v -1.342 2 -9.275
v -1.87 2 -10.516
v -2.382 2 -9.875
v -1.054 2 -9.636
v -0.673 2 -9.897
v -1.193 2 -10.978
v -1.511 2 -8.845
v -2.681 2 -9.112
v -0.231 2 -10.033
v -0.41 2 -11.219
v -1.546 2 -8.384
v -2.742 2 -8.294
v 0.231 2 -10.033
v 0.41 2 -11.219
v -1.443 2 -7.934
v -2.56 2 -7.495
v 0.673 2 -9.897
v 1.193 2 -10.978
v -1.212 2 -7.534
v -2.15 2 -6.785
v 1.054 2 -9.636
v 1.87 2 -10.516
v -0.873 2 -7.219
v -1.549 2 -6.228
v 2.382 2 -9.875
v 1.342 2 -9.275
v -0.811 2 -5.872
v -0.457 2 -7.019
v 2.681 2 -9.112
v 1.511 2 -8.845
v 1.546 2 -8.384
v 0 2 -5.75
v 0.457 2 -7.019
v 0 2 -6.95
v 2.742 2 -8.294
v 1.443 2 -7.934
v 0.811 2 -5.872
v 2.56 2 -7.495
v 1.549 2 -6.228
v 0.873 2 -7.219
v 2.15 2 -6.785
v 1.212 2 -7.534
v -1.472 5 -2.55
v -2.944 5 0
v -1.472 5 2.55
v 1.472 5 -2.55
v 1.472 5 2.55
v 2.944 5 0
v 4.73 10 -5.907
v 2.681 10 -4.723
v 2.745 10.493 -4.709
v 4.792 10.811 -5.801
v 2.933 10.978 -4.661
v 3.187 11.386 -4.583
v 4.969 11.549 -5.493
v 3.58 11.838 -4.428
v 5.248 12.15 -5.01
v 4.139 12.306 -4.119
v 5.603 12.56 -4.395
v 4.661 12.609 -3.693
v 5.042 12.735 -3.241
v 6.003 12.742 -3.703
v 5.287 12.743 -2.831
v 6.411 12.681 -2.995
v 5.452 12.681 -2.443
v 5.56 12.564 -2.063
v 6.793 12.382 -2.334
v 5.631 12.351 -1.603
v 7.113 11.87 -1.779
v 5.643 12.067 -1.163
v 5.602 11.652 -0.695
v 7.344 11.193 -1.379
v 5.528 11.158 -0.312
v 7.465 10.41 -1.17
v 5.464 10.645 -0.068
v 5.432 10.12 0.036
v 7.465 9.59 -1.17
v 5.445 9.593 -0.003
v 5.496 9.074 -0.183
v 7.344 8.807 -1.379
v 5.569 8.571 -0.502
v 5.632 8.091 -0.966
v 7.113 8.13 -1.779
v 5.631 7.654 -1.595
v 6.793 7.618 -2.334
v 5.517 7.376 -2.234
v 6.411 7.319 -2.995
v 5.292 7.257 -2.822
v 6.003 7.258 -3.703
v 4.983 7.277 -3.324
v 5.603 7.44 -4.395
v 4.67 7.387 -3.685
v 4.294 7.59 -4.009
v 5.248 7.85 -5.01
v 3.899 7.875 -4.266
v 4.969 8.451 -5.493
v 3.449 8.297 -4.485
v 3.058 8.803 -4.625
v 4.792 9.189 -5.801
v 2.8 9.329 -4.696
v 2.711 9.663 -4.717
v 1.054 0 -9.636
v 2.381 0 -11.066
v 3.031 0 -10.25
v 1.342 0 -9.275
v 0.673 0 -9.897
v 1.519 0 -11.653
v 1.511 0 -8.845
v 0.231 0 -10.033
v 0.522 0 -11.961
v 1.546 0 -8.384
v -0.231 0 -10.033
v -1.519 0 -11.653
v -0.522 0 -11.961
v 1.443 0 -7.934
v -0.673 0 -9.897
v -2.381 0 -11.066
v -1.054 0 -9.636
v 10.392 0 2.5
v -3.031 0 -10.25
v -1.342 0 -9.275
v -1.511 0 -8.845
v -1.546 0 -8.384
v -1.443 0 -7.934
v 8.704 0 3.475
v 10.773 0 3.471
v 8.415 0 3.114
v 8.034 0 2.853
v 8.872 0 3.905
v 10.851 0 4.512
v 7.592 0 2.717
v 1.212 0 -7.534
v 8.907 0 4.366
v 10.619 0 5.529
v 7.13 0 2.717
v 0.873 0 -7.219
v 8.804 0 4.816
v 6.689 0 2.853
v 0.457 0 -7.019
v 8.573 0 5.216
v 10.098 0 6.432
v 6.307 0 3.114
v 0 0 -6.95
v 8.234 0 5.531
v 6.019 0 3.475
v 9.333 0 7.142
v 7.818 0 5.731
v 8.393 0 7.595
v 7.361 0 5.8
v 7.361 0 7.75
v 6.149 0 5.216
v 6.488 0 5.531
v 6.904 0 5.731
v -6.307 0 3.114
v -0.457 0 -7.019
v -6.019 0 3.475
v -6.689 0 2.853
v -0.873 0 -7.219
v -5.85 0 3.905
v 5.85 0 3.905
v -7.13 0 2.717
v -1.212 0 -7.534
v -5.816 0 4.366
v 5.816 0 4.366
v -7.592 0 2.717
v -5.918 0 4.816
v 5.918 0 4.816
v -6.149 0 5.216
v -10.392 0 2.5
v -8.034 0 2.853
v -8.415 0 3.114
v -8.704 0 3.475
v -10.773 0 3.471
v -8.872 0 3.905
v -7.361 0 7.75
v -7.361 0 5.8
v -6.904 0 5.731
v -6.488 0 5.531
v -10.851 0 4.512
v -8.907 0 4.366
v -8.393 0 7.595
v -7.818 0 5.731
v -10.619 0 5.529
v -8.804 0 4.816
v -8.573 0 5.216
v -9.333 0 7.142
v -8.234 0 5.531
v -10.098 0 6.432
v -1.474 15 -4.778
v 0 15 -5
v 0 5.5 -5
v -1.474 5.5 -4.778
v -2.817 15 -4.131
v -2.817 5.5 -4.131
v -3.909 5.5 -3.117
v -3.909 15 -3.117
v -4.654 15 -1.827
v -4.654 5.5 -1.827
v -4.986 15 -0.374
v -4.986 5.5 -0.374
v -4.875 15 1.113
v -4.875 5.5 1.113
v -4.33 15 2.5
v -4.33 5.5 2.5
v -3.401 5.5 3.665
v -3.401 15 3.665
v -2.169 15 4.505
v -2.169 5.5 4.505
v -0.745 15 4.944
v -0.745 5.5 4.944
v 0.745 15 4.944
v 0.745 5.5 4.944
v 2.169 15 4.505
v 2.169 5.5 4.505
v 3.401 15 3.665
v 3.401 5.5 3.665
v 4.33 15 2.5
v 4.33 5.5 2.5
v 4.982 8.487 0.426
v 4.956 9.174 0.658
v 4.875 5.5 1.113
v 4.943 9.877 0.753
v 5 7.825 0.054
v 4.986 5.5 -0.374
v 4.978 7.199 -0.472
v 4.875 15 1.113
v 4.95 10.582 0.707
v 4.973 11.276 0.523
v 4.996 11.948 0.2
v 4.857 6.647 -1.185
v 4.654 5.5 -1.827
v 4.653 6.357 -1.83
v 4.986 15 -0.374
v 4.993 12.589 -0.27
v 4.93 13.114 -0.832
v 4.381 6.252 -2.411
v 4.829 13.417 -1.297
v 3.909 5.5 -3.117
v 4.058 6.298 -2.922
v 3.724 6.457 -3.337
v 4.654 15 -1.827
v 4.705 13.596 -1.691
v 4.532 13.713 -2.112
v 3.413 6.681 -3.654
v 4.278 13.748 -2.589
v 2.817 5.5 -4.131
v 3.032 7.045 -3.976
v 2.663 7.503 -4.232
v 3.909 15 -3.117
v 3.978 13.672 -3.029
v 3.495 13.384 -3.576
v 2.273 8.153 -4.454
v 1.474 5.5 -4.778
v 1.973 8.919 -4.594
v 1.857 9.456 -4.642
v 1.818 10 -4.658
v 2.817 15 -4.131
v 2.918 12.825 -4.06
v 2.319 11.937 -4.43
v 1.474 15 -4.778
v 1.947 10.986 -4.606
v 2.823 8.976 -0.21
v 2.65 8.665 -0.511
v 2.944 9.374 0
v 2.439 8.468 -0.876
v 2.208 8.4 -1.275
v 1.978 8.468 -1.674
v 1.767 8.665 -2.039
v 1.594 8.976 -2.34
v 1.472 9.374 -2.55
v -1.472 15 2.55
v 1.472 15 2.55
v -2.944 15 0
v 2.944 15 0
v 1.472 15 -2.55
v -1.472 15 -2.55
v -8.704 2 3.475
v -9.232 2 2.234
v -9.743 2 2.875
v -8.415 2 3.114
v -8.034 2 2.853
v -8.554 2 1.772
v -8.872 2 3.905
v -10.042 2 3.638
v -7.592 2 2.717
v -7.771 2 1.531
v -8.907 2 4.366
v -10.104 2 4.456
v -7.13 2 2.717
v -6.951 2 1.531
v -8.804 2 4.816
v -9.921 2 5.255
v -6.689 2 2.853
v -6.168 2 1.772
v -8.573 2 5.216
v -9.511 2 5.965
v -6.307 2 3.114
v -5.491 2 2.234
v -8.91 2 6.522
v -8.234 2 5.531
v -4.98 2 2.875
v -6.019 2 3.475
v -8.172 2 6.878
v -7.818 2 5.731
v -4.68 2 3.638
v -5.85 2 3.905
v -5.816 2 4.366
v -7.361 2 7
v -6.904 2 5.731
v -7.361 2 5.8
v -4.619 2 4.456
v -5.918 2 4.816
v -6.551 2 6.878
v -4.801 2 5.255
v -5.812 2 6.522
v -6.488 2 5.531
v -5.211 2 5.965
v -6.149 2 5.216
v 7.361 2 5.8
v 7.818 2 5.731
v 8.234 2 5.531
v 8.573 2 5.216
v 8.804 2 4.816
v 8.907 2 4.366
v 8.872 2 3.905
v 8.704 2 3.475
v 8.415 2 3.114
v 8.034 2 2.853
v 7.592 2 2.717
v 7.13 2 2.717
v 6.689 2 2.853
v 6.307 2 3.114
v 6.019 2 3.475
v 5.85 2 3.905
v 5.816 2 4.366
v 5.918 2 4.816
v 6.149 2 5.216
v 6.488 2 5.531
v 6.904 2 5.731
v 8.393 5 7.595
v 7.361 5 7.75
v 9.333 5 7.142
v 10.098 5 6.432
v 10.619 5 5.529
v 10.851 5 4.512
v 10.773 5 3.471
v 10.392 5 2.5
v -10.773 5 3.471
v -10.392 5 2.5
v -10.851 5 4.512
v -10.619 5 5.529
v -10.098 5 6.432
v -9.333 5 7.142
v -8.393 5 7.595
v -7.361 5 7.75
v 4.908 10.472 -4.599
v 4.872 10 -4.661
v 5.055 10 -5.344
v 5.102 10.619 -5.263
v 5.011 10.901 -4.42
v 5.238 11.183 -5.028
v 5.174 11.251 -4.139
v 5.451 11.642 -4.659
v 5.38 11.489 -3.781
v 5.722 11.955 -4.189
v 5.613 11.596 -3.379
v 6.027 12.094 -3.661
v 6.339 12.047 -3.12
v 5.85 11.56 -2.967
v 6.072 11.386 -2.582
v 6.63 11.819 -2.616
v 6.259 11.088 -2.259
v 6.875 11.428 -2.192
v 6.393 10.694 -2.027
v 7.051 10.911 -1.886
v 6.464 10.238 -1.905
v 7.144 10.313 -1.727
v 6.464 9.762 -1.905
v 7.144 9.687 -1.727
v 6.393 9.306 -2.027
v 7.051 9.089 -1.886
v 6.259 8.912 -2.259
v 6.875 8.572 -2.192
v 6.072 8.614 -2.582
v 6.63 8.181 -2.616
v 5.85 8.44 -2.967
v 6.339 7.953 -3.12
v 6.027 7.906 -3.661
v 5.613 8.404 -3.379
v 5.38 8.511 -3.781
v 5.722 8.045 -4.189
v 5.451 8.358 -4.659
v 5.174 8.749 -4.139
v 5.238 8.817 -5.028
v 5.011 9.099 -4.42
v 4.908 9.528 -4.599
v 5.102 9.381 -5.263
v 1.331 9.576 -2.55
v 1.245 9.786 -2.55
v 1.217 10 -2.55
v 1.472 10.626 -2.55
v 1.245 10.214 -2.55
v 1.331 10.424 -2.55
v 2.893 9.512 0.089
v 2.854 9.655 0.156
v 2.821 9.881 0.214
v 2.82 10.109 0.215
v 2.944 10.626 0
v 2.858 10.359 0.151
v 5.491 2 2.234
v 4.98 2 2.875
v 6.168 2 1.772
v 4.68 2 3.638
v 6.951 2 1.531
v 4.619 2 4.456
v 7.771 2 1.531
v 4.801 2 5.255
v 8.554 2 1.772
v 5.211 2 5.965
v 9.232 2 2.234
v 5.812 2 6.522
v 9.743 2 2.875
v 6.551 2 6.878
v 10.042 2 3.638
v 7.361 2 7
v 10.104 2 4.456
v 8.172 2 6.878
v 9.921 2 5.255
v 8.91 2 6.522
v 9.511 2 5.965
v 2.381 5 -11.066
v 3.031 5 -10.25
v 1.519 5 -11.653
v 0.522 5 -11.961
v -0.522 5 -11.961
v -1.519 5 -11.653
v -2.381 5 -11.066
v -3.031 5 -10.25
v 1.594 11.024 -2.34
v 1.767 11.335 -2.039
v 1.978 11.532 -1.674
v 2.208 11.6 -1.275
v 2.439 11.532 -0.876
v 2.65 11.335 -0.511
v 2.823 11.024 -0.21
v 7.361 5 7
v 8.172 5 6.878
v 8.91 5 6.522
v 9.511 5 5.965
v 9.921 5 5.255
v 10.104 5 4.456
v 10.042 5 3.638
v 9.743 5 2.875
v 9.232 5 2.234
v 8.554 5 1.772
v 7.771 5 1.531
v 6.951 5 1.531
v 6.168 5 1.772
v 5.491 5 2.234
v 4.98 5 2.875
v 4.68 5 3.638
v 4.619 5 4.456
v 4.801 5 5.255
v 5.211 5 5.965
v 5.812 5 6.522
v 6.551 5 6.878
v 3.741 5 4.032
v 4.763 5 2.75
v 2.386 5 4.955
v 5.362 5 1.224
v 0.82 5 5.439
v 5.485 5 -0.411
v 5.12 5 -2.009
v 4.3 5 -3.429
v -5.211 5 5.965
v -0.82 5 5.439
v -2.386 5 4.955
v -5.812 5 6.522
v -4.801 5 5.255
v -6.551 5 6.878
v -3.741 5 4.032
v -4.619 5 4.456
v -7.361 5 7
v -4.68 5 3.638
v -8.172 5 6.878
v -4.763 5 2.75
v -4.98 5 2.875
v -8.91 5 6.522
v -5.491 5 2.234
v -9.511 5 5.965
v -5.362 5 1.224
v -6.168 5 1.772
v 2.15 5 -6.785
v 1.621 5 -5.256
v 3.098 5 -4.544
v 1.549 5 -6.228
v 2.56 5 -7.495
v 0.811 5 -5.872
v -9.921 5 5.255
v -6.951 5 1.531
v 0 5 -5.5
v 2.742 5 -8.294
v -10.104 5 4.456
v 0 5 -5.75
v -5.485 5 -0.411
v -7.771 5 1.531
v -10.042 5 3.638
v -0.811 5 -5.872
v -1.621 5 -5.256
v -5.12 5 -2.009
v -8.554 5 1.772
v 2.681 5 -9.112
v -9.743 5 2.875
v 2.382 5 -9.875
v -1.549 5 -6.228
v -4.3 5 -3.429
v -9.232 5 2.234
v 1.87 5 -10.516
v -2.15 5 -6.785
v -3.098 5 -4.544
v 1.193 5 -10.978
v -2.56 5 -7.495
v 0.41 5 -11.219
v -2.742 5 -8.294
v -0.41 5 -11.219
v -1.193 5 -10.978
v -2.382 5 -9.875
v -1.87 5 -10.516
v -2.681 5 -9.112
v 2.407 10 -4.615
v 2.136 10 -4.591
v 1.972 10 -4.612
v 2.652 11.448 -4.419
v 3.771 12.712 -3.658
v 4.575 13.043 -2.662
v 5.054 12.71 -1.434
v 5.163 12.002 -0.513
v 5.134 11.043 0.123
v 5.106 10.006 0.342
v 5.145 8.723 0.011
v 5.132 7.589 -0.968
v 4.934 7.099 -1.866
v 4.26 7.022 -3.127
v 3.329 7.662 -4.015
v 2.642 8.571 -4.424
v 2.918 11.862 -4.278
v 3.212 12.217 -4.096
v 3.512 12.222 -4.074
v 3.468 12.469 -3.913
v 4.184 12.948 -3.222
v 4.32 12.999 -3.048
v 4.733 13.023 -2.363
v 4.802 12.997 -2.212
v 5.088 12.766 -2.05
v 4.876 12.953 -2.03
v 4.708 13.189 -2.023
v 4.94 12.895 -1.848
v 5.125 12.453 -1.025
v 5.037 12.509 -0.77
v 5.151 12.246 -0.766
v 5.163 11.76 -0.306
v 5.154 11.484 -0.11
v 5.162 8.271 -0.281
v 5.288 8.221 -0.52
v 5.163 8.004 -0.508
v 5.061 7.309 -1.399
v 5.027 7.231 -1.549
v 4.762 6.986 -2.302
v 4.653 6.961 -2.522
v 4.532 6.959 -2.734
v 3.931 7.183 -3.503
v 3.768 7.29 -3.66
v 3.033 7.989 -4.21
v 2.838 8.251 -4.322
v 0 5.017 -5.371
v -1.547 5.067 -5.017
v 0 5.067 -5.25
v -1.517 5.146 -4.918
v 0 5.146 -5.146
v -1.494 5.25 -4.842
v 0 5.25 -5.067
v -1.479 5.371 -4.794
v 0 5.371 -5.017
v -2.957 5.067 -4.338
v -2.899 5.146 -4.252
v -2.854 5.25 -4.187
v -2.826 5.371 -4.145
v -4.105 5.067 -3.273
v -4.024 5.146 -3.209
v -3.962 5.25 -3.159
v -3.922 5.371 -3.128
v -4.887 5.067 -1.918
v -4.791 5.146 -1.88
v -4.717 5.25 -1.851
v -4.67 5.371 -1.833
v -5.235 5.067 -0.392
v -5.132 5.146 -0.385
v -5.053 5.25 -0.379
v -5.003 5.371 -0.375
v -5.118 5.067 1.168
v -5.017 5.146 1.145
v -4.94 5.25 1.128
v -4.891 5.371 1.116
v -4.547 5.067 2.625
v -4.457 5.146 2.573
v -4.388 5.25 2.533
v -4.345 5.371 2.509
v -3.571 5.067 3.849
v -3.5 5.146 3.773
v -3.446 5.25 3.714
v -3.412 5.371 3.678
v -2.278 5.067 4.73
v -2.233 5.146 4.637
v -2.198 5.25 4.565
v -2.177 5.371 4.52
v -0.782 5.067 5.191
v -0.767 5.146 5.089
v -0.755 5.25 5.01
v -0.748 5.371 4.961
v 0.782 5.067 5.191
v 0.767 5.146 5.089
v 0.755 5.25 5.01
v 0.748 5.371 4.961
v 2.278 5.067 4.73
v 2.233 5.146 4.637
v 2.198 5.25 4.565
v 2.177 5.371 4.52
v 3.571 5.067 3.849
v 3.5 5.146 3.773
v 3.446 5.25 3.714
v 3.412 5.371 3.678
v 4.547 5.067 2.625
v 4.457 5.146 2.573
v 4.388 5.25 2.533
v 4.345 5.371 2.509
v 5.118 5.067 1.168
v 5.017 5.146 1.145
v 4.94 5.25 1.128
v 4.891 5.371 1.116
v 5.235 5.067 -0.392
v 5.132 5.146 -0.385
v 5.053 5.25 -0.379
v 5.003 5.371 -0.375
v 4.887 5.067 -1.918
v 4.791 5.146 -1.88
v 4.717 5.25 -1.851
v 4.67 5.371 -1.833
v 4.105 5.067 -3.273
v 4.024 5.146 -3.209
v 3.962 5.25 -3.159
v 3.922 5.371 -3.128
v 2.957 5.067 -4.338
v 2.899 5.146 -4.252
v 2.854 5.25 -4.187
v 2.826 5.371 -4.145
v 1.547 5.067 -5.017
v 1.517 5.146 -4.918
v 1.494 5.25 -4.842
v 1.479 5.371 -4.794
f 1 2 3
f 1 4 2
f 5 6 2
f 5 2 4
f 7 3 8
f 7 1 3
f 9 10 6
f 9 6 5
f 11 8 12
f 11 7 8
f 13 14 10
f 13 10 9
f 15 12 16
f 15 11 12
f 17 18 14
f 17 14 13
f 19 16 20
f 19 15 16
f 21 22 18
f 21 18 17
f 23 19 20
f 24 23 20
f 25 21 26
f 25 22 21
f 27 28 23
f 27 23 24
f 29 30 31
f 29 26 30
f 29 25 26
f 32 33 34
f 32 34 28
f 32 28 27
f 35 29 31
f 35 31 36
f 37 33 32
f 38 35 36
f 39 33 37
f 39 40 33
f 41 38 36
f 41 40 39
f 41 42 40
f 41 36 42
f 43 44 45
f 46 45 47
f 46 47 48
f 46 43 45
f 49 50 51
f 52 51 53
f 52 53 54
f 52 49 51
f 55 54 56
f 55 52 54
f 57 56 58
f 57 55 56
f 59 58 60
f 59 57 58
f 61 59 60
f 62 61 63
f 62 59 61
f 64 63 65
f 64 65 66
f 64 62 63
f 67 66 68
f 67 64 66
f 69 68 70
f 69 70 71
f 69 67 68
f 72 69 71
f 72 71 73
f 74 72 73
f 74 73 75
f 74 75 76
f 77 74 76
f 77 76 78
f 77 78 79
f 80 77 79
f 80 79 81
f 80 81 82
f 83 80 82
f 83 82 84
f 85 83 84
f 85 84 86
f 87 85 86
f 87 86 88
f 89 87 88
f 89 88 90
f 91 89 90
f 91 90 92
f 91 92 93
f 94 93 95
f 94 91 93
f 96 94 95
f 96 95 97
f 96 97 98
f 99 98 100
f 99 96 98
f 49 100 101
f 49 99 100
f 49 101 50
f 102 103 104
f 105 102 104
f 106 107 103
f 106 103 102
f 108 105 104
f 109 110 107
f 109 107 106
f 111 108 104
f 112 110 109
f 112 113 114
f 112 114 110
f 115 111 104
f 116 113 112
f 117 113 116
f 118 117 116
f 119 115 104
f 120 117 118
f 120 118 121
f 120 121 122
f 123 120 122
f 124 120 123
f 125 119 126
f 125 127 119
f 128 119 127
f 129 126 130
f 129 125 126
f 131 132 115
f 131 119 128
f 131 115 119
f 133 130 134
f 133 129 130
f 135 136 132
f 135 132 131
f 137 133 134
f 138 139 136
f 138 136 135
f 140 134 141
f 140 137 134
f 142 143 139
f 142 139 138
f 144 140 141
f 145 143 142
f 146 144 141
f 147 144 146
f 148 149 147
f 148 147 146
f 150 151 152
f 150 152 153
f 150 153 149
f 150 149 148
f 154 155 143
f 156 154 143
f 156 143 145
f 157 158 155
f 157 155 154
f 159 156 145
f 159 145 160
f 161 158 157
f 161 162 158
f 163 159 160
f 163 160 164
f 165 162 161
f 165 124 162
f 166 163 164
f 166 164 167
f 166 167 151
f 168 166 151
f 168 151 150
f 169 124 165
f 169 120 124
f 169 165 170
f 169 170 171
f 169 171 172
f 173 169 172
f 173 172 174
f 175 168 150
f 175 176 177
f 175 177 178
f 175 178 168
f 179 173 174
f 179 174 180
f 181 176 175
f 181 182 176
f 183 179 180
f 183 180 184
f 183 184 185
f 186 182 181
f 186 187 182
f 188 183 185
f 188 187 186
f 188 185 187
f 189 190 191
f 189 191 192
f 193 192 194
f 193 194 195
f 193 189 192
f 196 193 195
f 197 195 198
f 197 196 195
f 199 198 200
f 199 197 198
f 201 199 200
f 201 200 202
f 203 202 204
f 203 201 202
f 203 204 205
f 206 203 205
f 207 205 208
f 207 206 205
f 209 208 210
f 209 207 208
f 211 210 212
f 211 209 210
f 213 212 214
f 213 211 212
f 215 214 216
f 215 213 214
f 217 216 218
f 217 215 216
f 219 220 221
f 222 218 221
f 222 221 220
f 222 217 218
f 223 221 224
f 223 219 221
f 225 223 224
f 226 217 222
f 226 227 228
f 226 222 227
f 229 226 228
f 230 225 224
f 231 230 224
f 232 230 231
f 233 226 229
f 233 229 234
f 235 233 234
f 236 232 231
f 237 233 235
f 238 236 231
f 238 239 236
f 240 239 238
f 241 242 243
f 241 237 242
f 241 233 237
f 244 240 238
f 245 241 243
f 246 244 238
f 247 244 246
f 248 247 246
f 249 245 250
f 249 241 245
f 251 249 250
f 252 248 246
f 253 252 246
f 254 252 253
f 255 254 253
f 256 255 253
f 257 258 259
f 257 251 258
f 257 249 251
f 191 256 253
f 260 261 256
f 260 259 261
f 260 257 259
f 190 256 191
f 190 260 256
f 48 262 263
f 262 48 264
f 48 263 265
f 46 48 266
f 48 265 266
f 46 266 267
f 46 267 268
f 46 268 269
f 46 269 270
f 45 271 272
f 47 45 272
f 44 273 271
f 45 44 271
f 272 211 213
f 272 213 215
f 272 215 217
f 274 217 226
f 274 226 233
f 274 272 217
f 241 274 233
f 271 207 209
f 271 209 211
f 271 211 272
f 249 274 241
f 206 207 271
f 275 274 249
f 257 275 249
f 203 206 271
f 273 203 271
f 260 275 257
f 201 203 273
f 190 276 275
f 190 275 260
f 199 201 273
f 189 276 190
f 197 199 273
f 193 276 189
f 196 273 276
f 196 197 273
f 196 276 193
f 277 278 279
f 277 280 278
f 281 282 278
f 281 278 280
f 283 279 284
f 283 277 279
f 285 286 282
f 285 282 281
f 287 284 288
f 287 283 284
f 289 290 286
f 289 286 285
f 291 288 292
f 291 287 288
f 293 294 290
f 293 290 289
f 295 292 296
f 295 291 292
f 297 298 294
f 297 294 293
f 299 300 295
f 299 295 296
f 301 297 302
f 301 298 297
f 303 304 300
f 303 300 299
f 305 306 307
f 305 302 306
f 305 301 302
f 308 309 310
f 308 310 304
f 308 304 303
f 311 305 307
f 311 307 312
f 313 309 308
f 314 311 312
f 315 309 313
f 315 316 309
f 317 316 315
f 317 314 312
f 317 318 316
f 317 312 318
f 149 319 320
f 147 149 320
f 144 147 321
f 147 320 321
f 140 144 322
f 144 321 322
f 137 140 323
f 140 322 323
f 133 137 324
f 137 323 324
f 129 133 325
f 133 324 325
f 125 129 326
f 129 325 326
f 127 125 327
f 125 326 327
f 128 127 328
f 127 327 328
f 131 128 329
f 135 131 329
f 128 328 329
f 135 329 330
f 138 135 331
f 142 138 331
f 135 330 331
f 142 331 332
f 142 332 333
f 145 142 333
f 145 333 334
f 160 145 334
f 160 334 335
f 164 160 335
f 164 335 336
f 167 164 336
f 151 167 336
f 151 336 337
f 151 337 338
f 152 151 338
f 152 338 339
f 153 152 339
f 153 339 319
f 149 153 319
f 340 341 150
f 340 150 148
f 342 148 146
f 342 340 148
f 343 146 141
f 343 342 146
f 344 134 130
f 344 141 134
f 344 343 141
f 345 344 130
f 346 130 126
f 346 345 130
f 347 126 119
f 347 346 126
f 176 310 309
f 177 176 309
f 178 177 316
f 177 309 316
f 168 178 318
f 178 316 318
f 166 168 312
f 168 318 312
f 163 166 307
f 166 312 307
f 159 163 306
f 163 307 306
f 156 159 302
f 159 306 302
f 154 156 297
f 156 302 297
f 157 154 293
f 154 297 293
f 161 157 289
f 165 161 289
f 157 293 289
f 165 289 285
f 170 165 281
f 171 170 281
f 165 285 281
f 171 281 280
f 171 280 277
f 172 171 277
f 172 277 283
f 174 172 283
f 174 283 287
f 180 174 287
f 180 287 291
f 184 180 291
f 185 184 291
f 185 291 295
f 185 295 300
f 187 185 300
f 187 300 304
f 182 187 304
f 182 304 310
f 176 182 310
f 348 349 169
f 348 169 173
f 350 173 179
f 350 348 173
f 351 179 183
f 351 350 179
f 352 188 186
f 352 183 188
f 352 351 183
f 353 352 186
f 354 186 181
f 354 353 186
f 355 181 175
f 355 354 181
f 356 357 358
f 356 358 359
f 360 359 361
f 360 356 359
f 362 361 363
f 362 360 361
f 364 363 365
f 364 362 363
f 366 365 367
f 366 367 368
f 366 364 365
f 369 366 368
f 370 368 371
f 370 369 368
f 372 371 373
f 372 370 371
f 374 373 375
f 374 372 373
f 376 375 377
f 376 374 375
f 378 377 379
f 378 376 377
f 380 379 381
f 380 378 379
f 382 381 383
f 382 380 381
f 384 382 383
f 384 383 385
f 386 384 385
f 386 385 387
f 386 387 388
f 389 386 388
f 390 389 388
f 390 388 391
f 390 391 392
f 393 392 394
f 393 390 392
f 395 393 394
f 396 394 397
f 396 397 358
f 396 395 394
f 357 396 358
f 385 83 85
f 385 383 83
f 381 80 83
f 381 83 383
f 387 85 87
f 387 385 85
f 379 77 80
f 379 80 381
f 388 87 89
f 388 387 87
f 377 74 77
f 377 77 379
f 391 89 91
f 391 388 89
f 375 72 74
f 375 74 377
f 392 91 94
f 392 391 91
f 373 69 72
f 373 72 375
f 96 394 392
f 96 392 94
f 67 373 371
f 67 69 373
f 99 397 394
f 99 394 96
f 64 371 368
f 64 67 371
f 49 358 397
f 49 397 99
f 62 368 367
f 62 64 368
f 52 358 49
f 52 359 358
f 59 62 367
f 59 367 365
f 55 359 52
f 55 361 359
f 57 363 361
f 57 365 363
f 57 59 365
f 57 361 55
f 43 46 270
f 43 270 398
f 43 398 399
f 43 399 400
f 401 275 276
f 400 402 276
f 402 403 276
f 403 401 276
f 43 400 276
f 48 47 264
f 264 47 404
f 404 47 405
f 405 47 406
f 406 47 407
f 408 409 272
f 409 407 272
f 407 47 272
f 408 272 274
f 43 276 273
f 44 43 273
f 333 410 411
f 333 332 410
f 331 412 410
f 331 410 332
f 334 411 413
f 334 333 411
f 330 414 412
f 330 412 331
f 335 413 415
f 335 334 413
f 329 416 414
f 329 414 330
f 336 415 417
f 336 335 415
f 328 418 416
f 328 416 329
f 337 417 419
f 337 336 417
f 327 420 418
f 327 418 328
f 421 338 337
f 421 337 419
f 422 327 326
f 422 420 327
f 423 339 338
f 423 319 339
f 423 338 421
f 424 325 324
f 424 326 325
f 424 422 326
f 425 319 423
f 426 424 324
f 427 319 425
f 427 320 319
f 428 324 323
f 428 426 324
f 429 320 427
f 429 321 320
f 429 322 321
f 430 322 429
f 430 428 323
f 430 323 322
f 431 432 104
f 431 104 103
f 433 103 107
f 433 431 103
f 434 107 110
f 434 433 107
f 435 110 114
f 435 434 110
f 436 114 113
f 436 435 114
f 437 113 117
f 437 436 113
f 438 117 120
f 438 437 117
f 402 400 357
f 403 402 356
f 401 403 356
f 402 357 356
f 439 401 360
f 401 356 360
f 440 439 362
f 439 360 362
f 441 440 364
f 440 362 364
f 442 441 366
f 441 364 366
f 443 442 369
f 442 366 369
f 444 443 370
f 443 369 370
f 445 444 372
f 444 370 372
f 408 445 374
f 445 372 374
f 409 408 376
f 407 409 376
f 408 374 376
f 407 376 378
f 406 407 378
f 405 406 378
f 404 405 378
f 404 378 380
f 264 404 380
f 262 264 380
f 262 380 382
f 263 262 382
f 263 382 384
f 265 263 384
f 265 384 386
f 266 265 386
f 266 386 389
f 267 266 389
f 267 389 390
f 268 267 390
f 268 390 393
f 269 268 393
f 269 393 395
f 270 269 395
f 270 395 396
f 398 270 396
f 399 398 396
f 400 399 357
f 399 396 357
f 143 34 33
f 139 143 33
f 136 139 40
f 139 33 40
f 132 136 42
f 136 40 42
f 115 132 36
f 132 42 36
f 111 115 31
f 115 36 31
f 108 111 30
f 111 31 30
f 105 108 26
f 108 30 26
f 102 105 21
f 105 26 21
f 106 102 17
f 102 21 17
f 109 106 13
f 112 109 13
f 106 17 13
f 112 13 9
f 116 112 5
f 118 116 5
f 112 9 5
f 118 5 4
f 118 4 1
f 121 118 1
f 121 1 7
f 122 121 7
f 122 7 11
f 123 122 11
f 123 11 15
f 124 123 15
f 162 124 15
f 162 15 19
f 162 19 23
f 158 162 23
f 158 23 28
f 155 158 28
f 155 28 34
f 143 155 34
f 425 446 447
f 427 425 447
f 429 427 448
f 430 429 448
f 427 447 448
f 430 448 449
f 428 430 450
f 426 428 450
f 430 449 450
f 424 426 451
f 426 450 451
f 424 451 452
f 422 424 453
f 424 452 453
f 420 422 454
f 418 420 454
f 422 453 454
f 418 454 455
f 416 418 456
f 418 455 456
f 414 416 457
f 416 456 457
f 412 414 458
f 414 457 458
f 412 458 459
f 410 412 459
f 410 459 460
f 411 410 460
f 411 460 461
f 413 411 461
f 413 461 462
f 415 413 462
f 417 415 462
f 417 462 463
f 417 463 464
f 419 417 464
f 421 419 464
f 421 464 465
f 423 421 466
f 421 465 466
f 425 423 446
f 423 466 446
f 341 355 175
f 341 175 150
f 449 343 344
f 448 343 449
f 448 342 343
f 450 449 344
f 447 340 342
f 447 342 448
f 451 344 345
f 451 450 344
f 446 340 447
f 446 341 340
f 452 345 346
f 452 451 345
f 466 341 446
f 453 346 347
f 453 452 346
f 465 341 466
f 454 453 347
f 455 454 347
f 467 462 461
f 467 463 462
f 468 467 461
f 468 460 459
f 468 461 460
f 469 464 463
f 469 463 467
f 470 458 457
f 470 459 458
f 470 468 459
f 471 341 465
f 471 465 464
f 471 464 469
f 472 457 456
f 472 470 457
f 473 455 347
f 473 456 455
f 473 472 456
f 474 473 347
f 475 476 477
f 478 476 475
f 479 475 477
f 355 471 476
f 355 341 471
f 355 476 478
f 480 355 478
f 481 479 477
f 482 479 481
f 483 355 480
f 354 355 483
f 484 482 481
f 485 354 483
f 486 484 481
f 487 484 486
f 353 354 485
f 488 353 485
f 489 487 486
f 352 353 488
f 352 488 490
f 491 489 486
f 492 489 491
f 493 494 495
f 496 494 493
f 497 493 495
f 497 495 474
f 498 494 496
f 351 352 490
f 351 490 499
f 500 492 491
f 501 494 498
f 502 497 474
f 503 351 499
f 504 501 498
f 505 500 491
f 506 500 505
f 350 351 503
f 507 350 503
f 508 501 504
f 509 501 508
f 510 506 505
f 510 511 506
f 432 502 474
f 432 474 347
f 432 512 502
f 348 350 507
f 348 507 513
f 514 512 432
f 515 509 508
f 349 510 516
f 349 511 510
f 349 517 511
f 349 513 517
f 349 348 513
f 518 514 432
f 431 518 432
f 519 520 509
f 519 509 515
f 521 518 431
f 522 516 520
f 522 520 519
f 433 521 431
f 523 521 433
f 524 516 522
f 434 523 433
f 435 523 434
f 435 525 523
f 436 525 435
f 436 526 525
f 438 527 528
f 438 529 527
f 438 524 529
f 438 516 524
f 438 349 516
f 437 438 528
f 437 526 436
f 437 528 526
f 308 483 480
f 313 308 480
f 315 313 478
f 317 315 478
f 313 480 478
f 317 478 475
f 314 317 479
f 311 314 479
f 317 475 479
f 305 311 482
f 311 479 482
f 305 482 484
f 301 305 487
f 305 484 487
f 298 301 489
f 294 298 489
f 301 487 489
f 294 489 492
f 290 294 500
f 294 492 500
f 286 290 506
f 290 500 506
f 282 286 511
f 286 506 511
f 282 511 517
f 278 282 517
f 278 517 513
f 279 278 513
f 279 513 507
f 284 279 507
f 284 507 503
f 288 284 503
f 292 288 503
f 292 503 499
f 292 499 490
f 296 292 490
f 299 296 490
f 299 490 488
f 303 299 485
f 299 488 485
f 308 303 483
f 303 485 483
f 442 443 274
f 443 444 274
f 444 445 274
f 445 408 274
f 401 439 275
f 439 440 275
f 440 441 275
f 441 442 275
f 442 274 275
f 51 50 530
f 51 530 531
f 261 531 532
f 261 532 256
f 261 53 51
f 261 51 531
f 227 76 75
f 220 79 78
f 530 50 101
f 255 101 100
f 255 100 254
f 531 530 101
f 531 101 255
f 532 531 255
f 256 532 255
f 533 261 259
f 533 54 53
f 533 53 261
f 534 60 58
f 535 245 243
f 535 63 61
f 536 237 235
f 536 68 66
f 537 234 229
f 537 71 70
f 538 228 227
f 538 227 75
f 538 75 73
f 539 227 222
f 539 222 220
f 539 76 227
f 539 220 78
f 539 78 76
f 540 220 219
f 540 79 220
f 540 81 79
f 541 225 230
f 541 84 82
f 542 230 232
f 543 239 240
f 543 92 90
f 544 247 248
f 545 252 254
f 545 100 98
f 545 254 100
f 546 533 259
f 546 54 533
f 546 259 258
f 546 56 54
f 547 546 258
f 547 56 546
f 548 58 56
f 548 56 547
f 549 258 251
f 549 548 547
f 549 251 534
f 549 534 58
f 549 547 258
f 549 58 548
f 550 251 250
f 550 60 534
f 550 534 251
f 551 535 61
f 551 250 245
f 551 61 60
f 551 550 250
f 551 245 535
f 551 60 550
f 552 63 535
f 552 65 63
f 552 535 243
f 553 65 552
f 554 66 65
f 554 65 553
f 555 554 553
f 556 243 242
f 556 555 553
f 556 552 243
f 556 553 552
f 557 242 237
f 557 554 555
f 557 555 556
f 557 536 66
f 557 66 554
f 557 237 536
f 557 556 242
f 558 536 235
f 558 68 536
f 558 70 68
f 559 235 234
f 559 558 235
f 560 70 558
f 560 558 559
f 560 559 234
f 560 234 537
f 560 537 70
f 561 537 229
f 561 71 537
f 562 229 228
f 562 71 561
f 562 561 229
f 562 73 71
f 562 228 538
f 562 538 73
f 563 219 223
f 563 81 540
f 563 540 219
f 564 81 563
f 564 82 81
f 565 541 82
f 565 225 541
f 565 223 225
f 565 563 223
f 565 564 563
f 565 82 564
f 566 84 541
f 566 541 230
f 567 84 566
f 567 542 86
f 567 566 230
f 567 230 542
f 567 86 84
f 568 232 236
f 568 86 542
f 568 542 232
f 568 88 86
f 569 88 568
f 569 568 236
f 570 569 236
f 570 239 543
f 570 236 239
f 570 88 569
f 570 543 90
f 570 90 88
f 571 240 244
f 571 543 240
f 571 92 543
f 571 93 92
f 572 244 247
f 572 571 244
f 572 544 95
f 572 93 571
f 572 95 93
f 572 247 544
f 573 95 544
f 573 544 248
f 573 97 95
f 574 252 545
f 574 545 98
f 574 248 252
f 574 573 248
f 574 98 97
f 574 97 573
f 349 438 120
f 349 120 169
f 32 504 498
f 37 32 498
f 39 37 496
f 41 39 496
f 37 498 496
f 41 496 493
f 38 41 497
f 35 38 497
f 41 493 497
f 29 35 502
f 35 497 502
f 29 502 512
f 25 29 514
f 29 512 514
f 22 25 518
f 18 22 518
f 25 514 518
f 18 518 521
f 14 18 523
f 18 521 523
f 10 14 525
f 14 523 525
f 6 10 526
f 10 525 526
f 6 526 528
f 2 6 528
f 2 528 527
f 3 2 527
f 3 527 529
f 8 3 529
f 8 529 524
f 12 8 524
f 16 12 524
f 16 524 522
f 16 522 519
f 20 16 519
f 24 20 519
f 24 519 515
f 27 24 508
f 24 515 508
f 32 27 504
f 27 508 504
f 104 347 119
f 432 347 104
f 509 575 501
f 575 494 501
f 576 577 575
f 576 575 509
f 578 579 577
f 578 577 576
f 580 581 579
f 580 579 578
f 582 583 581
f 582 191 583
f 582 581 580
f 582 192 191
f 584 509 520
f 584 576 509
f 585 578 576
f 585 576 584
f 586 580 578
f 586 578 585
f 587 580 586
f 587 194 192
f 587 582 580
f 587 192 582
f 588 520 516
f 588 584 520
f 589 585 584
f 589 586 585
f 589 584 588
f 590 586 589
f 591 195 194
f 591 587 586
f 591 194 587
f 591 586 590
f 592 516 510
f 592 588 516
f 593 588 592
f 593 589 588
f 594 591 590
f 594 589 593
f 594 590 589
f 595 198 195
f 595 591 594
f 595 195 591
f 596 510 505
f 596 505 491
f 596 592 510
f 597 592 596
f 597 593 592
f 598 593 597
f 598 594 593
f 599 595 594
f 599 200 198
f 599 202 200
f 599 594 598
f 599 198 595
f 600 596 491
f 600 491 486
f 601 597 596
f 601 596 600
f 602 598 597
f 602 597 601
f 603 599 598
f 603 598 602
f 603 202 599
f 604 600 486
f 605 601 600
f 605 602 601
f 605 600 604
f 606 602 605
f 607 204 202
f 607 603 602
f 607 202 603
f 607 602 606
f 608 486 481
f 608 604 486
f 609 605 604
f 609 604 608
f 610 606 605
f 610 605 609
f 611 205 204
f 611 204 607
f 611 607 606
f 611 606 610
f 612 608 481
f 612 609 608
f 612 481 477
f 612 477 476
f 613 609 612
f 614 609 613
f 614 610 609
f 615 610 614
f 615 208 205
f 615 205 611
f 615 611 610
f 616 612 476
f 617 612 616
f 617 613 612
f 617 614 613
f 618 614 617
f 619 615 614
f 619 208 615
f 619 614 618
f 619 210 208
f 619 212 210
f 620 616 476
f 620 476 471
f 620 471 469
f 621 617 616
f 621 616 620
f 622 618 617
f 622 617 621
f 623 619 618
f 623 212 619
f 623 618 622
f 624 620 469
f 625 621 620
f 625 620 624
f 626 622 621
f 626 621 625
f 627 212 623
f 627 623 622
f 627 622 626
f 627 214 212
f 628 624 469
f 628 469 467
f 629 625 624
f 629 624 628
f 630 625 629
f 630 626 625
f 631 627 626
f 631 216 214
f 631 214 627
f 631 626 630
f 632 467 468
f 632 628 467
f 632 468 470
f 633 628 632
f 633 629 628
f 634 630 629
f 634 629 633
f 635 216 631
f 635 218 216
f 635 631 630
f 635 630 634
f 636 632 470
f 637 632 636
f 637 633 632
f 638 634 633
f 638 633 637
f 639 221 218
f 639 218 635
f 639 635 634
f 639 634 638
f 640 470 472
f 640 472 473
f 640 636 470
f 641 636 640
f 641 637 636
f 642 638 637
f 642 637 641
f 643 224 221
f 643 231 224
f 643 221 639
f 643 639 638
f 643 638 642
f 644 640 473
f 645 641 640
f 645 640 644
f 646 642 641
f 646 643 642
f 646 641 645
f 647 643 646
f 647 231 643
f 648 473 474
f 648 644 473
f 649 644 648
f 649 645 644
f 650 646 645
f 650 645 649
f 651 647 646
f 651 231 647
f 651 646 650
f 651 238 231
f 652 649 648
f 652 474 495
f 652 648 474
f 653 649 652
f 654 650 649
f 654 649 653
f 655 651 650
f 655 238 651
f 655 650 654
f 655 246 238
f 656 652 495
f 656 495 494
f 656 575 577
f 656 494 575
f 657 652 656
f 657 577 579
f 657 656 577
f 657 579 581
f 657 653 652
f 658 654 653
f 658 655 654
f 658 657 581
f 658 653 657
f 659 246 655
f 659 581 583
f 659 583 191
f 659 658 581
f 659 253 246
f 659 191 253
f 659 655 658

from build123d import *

# Parameters (mm, degrees)
SKETCH4_R                = 2.75
CUT_EXTRUDE4_DEPTH       = 3
SKETCH5_OUTSIDE_W        = 33.422
SKETCH5_OUTSIDE_H        = 33.422
CUT_EXTRUDE5_DEPTH       = 20.697715604
CUT_EXTRUDE2_DEPTH       = 10
BOSS_EXTRUDE1_REACH      = 27.298
BOSS_EXTRUDE1_END_RADIUS = 5
SKETCH3_R                = 2.75
CUT_EXTRUDE6_REACH       = 27.298
SKETCH6_R                = 1.6
FILLET1_R                = 0.5
CHAMFER1_SIZE            = 0.5
FILLET2_R                = 1
SKETCH7_R                = 1.55
CUT_EXTRUDE7_DEPTH       = 20.025404425


with BuildPart() as part:
    # Sketch1 → Revolve1 (revolve)
    with BuildSketch(Plane(origin=(0, 0, 0), x_dir=(0, 0, -1), z_dir=(1, 0, 0))):
        Polygon((0, 0), (12, 0), (12, 5), (5, 5), (5, 15), (0, 15), (0, 5.353547723), align=None)
    revolve(axis=Axis((0, 5.353547723, 0), (0, 1, 0)))

    # Sketch4 → Cut-Extrude4 (cut)
    with BuildSketch(Plane(origin=(0, 5, 0), x_dir=(1, 0, 0), z_dir=(0, 1, 0))):
        with Locations(Location((0, 8.5, 0), (0, 0, 270))):
            Circle(SKETCH4_R)
        with Locations(Location((7.361215932, -4.25, 0), (0, 0, 270))):
            Circle(SKETCH4_R)
        with Locations(Location((-7.361215932, -4.25, 0), (0, 0, 270))):
            Circle(SKETCH4_R)
    extrude(amount=-CUT_EXTRUDE4_DEPTH, mode=Mode.SUBTRACT)

    # Sketch5 outside → Cut-Extrude5 (cut, through all)
    with BuildSketch(Plane(origin=(0, 5, 0), x_dir=(1, 0, 0), z_dir=(0, 1, 0))):
        Rectangle(SKETCH5_OUTSIDE_W, SKETCH5_OUTSIDE_H)
        with BuildLine():
            Line((-3.031088913, 10.25), (-10.392304845, -2.5))
            ThreePointArc((-10.392304845, -2.5), (-10.392304845, -6), (-7.361215932, -7.75))
            Line((-7.361215932, -7.75), (7.361215932, -7.75))
            ThreePointArc((7.361215932, -7.75), (10.392304845, -6), (10.392304845, -2.5))
            Line((10.392304845, -2.5), (3.031088913, 10.25))
            ThreePointArc((3.031088913, 10.25), (0, 12), (-3.031088913, 10.25))
        make_face(mode=Mode.SUBTRACT)
    extrude(amount=-CUT_EXTRUDE5_DEPTH, mode=Mode.SUBTRACT)

    # Sketch2 → Cut-Extrude2 (cut)
    with BuildSketch(Plane(origin=(0, 15, 0), x_dir=(1, 0, 0), z_dir=(0, 1, 0))):
        Polygon((2.944486373, 0), (1.472243186, 2.55), (-1.472243186, 2.55), (-2.944486373, 0), (-1.472243186, -2.55), (1.472243186, -2.55), align=None)
    extrude(amount=-CUT_EXTRUDE2_DEPTH, mode=Mode.SUBTRACT)

    # Boss-Extrude1: up to this cylinder (the profile starts outside it)
    boss_extrude1_end = Plane(origin=(0, 10, 0), z_dir=(0, -1, 0)) * Cylinder(BOSS_EXTRUDE1_END_RADIUS, 65.596, mode=Mode.PRIVATE)
    # Sketch3 → Boss-Extrude1 (add, up to the surface)
    with BuildSketch(Plane(origin=(6.105479097, 0, -3.525), x_dir=(-0.5000000000000001, 0, -0.8660254037844386), z_dir=(0.8660254037844386, 0, -0.5000000000000001)), mode=Mode.PRIVATE) as boss_extrude1_sk1:
        with Locations((0, 10)):
            Circle(SKETCH3_R)
    boss_extrude1_tool1 = extrude(boss_extrude1_sk1.sketch, amount=-BOSS_EXTRUDE1_REACH, mode=Mode.PRIVATE) - boss_extrude1_end
    add(boss_extrude1_tool1.solids().sort_by_distance((6.105479, 10, -3.525))[0])

    # Sketch6 → Cut-Extrude6 (cut, up to next)
    with BuildSketch(Plane(origin=(6.105479097, 0, -3.525), x_dir=(-0.5000000000000001, 0, -0.8660254037844386), z_dir=(0.8660254037844386, 0, -0.5000000000000001)), mode=Mode.PRIVATE) as cut_extrude6_sk1:
        with Locations((0, 10)):
            Circle(SKETCH6_R)
    cut_extrude6_tool1 = extrude(cut_extrude6_sk1.sketch, amount=-CUT_EXTRUDE6_REACH, mode=Mode.PRIVATE) & part.part
    add(cut_extrude6_tool1.solids().sort_by_distance((6.105479, 10, -3.525))[0], mode=Mode.SUBTRACT)

    # Fillet1
    fillet1_edges = [part.edges().sort_by_distance(p)[0] for p in [
        (0, 5, 5),
    ]]
    fillet(fillet1_edges, radius=FILLET1_R)

    # Chamfer1
    chamfer1_edges = [part.edges().sort_by_distance(p)[0] for p in [
        (6.905479097, 10, -2.139359354),
    ]]
    chamfer(chamfer1_edges, length=CHAMFER1_SIZE)

    # Fillet2
    fillet2_edges = [part.edges().sort_by_distance(p)[0] for p in [
        (4.991369035, 9.999999998, 0.293658225),
    ]]
    fillet(fillet2_edges, radius=FILLET2_R)

    # Sketch7 → Cut-Extrude7 (cut, through all)
    with BuildSketch(Plane(origin=(0, 5, 0), x_dir=(1, 0, 0), z_dir=(0, 1, 0))):
        with Locations(Location((0, 8.5, 0), (0, 0, 270))):
            Circle(SKETCH7_R)
        with Locations(Location((7.361215932, -4.25, 0), (0, 0, 270))):
            Circle(SKETCH7_R)
        with Locations(Location((-7.361215932, -4.25, 0), (0, 0, 270))):
            Circle(SKETCH7_R)
    extrude(amount=-CUT_EXTRUDE7_DEPTH, mode=Mode.SUBTRACT)


solid = part.part
